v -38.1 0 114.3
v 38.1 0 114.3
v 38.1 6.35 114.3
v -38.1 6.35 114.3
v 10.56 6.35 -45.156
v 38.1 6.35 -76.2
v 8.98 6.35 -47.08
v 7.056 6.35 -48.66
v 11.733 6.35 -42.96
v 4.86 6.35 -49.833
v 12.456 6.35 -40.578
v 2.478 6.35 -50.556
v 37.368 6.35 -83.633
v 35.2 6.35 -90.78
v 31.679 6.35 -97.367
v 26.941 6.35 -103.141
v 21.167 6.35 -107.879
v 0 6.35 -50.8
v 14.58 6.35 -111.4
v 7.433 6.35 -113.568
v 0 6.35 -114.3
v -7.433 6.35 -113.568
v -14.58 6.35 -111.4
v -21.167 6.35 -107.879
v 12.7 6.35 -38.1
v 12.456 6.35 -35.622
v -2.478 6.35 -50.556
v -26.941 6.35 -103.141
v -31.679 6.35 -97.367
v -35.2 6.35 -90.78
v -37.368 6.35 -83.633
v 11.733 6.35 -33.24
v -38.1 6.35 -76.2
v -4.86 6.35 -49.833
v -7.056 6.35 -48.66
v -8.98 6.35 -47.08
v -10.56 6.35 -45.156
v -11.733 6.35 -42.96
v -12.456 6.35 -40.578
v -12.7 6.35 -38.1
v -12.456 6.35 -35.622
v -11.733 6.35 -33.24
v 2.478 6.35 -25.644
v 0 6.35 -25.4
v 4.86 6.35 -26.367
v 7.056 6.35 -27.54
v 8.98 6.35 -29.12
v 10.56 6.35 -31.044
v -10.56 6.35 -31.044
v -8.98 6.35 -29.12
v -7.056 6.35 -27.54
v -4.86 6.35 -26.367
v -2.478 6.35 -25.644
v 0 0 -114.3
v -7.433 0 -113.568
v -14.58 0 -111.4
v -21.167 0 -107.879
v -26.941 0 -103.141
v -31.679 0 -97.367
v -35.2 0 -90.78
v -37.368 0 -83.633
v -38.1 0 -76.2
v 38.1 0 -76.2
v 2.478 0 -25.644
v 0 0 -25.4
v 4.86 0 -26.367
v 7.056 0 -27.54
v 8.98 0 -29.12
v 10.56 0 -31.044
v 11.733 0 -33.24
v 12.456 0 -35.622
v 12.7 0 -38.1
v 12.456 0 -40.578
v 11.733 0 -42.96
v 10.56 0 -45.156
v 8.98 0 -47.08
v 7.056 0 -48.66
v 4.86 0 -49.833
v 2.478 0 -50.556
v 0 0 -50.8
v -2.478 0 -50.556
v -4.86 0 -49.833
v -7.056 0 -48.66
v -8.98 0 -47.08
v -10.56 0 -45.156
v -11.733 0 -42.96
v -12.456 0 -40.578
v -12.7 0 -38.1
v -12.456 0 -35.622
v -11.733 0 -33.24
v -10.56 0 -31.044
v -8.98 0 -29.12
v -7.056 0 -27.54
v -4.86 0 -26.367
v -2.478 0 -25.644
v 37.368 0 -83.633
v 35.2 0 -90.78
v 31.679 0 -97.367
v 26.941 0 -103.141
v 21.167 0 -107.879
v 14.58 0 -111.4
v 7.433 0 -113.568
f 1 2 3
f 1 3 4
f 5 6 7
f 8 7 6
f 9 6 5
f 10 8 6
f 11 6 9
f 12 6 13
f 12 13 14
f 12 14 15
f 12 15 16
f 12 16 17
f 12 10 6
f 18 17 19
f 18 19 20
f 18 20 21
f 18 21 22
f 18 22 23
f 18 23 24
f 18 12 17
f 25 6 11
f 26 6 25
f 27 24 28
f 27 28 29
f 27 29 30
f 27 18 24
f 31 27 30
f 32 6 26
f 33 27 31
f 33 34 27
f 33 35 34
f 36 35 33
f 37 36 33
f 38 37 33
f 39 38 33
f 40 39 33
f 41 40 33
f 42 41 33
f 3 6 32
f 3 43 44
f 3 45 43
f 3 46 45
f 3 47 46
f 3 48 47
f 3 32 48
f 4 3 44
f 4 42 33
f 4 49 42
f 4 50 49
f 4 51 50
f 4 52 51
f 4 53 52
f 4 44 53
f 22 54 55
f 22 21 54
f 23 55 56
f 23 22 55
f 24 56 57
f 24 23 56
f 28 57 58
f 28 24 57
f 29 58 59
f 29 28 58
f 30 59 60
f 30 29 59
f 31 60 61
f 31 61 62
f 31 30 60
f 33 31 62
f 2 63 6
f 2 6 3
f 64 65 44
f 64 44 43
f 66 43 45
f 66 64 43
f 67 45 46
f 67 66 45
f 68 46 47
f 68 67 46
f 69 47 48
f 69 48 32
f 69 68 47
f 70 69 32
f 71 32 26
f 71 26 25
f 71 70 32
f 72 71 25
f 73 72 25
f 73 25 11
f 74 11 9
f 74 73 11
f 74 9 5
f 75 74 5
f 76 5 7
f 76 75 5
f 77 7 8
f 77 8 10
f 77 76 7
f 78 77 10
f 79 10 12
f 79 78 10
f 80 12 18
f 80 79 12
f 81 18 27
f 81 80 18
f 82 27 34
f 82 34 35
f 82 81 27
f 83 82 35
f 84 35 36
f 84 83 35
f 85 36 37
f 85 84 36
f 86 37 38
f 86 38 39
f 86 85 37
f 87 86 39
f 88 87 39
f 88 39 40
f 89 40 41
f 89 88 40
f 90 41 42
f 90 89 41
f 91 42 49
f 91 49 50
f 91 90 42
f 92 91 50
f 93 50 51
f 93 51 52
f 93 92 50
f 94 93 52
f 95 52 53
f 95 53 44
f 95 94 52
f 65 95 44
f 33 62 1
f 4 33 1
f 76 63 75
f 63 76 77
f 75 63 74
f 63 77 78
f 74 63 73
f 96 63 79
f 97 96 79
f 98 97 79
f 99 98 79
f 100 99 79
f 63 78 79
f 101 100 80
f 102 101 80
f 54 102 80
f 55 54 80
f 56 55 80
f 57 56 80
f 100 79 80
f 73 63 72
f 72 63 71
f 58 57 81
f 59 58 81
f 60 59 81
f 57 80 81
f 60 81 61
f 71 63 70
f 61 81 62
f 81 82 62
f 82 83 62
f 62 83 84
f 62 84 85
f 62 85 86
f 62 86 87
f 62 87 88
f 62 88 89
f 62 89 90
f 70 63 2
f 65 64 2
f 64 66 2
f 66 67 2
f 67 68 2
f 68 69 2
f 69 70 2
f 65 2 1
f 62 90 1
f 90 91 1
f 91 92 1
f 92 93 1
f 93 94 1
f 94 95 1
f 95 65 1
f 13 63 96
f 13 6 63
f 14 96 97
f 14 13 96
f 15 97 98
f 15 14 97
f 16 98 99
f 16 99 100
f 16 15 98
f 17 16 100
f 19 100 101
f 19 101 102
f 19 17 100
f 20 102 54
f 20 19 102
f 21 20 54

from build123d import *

# Parameters (mm, degrees)
SKETCH1_W           = 76.2
SKETCH1_H           = 228.6
SKETCH1_R           = 12.7
BOSS_EXTRUDE1_DEPTH = 6.35
FILLET1_R           = 38.1


with BuildPart() as part:
    # Sketch1 → Boss-Extrude1 (new body)
    with BuildSketch(Plane(origin=(0, 0, 0), x_dir=(-1, 0, 0), z_dir=(0, 1, 0))):
        Rectangle(SKETCH1_W, SKETCH1_H)
        with Locations(Location((0, -38.1, 0), (0, 0, 90))):
            Circle(SKETCH1_R, mode=Mode.SUBTRACT)
    extrude(amount=BOSS_EXTRUDE1_DEPTH)

    # Fillet1
    fillet1_edges = [part.edges().sort_by_distance(p)[0] for p in [
        (-38.1, 3.175, -114.3),
        (38.1, 3.175, -114.3),
    ]]
    fillet(fillet1_edges, radius=FILLET1_R - 0.0001)  # a hair under: the kernel refuses the full size


solid = part.part
